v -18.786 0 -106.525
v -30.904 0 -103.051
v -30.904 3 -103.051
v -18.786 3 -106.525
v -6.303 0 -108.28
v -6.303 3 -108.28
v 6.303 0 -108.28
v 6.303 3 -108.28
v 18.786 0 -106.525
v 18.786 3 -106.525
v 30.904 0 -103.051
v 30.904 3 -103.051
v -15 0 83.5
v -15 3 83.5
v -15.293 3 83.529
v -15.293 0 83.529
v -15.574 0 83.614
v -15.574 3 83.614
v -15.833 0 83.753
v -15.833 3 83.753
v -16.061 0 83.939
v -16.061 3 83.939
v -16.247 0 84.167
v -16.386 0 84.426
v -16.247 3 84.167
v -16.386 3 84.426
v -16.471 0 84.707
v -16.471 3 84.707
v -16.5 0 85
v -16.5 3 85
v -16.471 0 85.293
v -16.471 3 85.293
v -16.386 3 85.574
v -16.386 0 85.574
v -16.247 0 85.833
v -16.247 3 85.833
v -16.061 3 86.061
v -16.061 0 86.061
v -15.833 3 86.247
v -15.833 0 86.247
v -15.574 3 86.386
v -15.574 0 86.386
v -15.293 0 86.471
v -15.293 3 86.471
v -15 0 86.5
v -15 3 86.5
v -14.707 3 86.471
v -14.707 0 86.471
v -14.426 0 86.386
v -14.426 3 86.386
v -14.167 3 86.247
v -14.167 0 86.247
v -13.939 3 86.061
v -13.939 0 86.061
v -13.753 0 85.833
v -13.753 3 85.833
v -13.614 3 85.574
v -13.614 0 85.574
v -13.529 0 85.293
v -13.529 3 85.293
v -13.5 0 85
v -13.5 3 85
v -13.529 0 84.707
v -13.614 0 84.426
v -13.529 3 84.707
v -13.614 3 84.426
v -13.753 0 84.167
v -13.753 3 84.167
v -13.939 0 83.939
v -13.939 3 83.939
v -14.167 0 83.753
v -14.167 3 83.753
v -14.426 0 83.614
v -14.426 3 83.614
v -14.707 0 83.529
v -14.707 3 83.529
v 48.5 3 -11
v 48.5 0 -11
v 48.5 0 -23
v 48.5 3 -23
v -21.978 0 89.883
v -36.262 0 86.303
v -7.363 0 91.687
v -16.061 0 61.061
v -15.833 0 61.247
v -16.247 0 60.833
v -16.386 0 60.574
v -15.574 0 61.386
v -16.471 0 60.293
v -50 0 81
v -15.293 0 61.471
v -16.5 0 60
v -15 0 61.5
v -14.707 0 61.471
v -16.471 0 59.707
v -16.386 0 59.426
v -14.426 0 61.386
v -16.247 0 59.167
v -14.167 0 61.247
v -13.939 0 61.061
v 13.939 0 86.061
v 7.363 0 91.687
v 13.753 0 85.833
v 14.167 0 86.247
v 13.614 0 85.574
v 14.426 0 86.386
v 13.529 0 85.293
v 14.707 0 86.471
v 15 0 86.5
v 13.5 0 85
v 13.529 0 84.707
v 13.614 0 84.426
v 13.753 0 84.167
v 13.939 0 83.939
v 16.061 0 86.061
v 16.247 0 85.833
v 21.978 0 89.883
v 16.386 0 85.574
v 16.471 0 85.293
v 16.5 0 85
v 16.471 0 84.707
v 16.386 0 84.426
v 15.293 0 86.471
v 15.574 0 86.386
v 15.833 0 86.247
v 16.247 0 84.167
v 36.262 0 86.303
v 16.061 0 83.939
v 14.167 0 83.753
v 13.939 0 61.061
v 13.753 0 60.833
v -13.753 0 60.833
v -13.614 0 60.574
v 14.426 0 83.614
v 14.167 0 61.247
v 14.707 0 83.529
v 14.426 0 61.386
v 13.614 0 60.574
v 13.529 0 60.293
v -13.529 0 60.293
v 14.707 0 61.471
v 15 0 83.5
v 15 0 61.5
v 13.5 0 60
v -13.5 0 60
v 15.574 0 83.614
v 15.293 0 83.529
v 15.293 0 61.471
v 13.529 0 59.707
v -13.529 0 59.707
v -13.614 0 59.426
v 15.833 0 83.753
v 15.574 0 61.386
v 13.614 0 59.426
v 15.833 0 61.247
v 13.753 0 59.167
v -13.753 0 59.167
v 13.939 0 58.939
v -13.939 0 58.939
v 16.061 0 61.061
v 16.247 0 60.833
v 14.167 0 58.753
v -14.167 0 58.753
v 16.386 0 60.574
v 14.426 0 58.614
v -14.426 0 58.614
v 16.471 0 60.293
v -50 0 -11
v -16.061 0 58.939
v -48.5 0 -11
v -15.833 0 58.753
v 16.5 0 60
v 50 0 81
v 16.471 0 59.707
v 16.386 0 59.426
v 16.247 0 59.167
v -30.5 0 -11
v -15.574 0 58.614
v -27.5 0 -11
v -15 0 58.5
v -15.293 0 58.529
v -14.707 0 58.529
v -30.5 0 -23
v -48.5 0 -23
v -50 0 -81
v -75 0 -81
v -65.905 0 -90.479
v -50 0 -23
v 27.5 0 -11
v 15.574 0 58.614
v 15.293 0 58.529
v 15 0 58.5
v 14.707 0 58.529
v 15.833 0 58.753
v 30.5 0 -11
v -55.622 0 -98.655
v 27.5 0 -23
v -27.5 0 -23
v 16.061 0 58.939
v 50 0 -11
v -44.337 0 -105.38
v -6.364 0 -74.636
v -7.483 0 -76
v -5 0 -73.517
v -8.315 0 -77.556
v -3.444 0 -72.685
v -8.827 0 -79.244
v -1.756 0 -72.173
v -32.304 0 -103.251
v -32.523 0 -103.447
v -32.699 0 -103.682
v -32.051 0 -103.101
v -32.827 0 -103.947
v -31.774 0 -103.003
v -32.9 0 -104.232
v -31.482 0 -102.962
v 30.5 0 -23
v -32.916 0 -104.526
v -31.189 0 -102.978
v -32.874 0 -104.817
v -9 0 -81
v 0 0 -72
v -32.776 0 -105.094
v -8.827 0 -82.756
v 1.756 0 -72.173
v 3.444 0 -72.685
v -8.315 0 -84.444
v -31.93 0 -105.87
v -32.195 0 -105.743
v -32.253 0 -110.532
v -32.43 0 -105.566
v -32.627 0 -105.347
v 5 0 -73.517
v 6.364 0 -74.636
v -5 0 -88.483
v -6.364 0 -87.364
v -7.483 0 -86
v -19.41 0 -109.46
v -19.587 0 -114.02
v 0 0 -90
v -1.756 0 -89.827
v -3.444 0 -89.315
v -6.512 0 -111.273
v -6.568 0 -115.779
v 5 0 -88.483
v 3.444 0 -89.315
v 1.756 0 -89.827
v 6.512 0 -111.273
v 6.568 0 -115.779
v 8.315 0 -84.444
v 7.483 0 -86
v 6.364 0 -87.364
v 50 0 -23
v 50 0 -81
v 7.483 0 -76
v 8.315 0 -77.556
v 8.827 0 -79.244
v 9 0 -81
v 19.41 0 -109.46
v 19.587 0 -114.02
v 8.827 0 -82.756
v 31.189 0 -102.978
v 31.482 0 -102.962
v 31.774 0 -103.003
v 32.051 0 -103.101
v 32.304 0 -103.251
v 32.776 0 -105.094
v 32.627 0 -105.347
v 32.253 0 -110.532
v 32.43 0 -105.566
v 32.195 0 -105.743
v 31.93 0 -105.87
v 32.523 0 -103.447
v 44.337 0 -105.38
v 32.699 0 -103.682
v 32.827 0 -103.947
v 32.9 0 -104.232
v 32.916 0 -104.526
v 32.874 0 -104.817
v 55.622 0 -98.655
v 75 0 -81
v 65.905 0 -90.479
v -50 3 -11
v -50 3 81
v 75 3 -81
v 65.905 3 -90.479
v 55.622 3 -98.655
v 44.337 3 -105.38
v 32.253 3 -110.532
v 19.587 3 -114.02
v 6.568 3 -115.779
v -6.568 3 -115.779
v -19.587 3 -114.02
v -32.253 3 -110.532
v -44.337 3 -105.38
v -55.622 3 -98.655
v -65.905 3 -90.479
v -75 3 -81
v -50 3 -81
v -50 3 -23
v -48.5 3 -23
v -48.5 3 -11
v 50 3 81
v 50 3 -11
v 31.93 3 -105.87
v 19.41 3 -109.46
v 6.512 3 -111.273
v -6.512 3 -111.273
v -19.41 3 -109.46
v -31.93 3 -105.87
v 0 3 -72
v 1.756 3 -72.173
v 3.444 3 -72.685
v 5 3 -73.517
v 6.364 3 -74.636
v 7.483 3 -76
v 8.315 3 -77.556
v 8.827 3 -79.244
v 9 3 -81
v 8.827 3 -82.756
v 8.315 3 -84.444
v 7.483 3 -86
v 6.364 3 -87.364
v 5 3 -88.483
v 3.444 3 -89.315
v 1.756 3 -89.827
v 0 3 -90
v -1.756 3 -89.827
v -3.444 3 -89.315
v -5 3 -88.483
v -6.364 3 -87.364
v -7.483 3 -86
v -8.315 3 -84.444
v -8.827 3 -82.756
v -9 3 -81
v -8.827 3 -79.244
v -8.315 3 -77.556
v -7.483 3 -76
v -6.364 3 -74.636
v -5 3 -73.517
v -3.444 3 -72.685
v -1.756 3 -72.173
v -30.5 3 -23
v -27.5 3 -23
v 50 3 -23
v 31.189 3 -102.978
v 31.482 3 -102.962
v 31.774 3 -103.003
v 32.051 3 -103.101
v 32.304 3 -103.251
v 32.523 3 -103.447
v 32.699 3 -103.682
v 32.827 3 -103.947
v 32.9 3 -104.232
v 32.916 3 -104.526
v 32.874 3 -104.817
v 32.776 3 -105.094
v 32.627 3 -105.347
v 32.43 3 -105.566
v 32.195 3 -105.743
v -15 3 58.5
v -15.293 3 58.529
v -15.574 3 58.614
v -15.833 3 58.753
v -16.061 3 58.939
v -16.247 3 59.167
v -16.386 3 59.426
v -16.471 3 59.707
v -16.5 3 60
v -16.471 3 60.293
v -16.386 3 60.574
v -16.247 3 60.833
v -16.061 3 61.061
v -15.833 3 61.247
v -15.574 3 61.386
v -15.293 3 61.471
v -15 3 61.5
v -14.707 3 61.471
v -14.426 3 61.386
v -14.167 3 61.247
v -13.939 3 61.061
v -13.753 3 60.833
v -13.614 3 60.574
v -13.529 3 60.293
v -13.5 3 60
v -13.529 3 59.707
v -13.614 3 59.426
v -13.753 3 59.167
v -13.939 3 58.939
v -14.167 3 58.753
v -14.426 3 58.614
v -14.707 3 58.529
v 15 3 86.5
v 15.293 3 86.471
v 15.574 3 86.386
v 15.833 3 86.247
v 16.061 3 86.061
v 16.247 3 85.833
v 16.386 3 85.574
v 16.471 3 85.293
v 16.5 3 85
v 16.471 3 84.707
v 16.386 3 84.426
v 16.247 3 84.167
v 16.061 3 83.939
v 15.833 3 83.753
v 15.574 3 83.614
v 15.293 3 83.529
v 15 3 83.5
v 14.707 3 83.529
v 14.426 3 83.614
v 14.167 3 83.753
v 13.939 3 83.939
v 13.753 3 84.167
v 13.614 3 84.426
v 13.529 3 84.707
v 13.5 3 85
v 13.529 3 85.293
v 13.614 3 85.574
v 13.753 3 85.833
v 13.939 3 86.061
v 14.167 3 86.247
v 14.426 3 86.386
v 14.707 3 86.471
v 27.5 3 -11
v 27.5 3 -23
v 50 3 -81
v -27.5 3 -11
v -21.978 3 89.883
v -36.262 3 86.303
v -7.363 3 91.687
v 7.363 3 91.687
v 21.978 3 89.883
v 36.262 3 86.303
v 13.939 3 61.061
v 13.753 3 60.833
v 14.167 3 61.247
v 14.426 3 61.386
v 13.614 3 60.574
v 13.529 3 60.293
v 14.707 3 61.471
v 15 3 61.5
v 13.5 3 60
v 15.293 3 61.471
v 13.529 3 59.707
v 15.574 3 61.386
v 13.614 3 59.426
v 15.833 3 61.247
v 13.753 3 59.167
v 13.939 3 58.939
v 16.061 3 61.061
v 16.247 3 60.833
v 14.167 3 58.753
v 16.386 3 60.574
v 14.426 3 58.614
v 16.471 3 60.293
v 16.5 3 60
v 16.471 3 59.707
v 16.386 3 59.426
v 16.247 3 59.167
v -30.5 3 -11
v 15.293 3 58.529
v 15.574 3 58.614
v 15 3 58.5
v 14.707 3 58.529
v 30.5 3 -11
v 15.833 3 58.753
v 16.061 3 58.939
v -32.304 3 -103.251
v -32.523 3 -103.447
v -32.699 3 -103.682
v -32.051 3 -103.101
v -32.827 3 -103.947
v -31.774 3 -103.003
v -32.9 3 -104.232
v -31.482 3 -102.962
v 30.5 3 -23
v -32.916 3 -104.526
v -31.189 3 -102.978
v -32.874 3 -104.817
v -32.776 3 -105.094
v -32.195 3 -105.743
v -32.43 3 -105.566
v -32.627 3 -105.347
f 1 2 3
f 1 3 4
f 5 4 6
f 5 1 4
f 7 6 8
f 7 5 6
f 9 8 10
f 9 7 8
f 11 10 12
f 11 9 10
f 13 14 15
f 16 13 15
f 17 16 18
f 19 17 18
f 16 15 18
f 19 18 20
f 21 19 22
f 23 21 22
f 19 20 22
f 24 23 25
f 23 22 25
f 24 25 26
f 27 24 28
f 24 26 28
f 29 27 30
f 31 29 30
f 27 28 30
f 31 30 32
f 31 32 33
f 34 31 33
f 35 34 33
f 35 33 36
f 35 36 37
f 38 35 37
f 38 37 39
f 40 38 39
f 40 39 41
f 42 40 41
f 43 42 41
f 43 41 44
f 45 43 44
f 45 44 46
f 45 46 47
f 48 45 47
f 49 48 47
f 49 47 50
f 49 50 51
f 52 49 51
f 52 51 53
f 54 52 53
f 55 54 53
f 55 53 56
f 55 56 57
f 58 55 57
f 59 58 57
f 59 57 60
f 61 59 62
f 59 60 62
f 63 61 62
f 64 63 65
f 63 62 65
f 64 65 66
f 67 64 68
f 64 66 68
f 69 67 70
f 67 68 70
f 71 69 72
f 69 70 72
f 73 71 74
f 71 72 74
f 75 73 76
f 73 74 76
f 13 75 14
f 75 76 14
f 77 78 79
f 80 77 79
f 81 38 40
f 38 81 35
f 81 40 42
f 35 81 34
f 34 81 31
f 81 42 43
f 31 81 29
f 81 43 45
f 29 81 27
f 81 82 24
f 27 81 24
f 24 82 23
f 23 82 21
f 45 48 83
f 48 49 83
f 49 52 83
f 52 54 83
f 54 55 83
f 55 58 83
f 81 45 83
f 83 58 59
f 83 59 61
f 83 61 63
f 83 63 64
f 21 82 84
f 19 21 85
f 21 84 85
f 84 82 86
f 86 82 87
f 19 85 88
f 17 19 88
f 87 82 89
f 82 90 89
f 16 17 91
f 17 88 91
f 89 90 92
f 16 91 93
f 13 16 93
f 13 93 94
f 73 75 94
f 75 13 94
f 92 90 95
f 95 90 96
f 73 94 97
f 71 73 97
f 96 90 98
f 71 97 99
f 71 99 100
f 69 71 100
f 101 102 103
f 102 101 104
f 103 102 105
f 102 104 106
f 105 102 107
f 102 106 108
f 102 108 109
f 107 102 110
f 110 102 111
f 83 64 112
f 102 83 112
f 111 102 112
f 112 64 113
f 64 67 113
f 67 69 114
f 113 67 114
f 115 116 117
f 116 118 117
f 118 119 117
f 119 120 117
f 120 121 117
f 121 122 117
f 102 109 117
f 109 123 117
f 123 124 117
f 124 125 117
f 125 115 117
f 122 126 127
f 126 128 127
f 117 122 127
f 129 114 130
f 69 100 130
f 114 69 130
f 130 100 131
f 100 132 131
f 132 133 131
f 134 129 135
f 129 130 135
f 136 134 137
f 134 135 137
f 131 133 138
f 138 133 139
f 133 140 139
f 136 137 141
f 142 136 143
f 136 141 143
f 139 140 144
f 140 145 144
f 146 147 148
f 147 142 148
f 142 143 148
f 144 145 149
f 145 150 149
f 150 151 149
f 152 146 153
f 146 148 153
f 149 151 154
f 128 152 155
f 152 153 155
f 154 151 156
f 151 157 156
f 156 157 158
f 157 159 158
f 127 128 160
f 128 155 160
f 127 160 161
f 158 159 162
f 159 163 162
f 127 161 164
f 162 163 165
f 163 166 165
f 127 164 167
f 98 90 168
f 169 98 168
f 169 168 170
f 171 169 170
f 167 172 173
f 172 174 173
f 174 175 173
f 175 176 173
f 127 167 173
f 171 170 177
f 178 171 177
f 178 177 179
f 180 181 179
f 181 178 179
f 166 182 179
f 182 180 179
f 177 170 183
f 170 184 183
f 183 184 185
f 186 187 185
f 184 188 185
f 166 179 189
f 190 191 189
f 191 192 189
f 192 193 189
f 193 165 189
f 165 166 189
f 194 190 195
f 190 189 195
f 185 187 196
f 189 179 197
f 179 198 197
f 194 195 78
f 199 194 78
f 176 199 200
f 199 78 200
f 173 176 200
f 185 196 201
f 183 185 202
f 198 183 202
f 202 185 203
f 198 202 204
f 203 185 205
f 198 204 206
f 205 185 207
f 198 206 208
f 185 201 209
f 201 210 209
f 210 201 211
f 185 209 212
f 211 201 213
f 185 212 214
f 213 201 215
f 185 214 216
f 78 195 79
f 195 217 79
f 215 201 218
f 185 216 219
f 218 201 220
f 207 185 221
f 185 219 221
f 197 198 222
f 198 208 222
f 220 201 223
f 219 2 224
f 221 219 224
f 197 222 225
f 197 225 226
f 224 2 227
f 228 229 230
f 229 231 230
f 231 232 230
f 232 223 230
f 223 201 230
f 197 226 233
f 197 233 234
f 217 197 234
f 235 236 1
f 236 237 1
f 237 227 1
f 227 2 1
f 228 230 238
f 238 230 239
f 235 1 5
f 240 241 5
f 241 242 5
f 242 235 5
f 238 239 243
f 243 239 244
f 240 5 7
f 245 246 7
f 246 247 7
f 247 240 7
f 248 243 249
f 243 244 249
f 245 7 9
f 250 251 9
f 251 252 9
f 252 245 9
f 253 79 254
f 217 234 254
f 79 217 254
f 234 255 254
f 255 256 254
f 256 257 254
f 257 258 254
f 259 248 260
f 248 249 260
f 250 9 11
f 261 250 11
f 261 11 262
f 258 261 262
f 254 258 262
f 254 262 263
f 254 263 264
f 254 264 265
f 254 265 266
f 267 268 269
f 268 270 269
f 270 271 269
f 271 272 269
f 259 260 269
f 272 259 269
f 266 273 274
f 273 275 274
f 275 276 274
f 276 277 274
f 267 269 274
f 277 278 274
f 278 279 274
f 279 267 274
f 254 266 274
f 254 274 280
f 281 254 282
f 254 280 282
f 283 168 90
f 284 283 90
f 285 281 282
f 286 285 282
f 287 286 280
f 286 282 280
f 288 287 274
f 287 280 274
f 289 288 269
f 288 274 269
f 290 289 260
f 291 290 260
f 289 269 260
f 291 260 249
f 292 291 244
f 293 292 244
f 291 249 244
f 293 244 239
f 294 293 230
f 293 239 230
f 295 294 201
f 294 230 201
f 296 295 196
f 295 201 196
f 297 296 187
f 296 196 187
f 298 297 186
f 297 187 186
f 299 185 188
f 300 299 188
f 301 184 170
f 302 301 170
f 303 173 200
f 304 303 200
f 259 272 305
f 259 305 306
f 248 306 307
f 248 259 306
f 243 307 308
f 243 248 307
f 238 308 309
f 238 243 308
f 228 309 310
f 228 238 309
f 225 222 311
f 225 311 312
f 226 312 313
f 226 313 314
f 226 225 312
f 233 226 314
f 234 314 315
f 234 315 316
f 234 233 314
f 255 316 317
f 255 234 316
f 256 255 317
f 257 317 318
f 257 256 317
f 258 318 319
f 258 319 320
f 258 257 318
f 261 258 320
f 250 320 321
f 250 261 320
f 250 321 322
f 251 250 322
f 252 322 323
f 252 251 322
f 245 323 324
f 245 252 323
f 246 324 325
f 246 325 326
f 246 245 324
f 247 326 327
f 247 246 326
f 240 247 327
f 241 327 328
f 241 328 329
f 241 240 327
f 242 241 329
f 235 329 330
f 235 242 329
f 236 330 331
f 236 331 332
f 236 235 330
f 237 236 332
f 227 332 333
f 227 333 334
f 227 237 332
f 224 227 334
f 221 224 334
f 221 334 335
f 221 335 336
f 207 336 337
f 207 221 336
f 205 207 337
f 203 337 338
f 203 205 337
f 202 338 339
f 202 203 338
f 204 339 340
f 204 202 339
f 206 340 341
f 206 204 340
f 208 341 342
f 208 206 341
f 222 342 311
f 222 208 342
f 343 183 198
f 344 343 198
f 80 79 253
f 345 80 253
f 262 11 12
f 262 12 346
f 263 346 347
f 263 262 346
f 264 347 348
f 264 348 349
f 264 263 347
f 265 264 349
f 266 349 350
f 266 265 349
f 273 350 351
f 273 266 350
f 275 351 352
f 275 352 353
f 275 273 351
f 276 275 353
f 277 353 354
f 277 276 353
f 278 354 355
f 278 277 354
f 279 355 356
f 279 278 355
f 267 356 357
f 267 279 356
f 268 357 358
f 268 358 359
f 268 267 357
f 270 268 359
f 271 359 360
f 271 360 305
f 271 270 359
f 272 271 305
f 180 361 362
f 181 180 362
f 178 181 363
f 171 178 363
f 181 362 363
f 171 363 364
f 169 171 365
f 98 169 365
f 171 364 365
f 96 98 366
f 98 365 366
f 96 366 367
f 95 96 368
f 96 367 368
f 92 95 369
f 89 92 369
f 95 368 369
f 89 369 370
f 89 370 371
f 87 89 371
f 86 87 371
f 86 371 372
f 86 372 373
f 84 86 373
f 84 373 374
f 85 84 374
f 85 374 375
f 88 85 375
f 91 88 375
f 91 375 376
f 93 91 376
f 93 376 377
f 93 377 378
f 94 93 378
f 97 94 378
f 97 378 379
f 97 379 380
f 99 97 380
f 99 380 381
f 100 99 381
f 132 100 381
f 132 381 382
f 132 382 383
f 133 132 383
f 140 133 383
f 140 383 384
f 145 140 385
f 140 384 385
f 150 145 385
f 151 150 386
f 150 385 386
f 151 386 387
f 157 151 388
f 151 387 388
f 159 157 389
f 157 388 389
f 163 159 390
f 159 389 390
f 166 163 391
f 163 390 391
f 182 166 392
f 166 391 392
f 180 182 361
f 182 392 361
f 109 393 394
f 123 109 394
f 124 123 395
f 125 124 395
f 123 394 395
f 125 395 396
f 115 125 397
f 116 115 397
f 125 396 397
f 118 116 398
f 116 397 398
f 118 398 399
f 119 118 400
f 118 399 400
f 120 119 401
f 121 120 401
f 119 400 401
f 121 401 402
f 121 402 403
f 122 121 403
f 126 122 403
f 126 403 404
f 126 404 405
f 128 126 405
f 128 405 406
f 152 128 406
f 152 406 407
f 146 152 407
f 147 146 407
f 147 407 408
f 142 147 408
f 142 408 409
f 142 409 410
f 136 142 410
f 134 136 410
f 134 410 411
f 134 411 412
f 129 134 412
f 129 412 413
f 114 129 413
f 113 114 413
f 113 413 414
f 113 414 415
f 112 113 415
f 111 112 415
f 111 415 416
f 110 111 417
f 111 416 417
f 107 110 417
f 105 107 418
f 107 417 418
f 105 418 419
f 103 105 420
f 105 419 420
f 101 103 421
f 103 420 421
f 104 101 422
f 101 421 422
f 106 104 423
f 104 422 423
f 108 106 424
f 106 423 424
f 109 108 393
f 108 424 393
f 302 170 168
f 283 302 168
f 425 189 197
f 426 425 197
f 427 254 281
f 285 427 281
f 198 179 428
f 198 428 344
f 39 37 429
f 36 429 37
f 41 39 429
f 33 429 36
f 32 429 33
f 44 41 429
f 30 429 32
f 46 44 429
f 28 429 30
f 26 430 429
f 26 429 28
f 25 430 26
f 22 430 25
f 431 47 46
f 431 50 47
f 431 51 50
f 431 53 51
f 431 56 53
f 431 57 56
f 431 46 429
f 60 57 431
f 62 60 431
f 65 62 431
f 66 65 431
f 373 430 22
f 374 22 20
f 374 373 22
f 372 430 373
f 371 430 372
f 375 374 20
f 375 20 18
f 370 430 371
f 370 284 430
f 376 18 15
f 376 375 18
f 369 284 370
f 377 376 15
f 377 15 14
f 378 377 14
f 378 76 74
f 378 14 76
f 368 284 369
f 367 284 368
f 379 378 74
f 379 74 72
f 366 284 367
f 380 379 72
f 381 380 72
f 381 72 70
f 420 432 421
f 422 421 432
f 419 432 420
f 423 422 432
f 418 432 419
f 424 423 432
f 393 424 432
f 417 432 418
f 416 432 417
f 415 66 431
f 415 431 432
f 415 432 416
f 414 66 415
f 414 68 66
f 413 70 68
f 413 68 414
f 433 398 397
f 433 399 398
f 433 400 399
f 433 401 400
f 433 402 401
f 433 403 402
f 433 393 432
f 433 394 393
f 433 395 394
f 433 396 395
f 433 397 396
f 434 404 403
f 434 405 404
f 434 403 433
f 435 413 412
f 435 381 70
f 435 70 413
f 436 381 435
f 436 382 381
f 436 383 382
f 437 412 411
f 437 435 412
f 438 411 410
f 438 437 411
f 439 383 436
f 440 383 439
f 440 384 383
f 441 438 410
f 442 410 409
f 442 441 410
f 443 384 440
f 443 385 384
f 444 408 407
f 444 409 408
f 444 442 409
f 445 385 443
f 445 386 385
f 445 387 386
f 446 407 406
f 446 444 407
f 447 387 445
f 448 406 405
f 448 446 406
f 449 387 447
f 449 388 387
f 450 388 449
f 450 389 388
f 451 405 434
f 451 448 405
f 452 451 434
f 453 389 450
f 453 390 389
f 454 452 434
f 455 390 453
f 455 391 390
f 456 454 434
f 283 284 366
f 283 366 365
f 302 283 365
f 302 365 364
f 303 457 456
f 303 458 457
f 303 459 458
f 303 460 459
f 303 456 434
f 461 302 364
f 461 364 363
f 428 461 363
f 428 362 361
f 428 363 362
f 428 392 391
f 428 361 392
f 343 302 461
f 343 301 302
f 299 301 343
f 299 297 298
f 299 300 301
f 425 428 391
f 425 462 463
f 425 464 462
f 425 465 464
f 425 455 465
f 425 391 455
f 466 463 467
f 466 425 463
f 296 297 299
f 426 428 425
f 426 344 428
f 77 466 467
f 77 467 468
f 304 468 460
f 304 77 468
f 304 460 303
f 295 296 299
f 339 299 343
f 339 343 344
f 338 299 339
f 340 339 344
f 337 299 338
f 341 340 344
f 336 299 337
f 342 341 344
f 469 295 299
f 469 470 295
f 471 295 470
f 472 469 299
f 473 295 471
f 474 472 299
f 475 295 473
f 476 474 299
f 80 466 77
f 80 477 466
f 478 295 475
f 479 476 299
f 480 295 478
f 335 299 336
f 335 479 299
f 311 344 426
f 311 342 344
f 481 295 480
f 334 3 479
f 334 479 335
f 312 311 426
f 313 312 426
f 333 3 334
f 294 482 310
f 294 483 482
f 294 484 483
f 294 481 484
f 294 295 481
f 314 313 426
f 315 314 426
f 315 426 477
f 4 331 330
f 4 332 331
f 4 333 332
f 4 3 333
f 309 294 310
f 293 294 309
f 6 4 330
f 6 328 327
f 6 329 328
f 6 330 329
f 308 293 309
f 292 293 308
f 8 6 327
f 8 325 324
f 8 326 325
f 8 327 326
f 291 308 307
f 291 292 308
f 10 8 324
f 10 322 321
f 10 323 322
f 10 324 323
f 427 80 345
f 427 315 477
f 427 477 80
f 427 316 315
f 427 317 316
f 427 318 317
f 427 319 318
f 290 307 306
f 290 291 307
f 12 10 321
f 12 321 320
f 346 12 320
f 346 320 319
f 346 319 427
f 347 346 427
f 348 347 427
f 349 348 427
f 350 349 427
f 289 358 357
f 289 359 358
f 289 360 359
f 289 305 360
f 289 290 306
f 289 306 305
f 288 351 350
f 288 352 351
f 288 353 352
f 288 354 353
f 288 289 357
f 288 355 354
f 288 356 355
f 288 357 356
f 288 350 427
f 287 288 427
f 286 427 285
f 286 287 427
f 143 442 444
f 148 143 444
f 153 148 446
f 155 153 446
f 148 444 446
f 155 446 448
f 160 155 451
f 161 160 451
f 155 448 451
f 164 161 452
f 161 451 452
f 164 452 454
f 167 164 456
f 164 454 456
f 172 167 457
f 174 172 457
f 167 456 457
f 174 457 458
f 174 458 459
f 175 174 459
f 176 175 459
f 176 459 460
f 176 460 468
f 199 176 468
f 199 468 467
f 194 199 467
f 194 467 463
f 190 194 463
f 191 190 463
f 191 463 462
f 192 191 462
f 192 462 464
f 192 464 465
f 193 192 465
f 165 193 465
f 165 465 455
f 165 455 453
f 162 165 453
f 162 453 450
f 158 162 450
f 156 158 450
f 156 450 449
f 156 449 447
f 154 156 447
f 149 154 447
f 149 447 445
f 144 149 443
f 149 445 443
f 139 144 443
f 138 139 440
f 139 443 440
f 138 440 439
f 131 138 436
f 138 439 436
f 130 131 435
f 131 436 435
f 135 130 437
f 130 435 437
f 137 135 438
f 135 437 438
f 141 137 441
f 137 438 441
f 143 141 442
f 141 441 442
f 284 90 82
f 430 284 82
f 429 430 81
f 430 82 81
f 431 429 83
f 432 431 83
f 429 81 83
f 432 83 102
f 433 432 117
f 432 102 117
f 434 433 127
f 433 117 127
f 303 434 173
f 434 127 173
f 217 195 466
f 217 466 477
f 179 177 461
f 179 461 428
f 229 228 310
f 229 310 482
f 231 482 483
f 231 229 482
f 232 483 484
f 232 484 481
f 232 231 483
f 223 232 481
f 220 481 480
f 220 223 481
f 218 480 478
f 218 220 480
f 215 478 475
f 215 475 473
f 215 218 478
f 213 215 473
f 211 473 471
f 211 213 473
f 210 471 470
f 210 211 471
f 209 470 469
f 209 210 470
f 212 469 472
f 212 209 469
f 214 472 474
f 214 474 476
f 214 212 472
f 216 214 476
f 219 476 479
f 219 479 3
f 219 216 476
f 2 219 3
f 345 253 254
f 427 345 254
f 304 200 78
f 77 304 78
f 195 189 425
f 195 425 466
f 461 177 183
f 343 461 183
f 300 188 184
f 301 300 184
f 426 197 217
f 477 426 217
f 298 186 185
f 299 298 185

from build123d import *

# Parameters (mm, degrees)
SKETCH1_R           = 9
SKETCH1_W           = 3
SKETCH1_H           = 12
BOSS_EXTRUDE1_DEPTH = 3
SKETCH2_R           = 1.5
CUT_EXTRUDE1_DEPTH  = 139.166566144


with BuildPart() as part:
    # Sketch1 → Boss-Extrude1 (new body)
    with BuildSketch(Plane(origin=(0, 0, 0), x_dir=(1, 0, 0), z_dir=(0, 1, 0))):
        with BuildLine():
            Line((50, -81), (50, 11))
            Line((50, 11), (48.5, 11))
            Line((48.5, 11), (48.5, 23))
            Line((48.5, 23), (50, 23))
            Line((50, 23), (50, 81))
            Line((50, 81), (75, 81))
            ThreePointArc((75, 81), (0, 116), (-75, 81))
            Line((-75, 81), (-50, 81))
            Line((-50, 81), (-50, 23))
            Line((-50, 23), (-48.5, 23))
            Line((-48.5, 23), (-48.5, 11))
            Line((-48.5, 11), (-50, 11))
            Line((-50, 11), (-50, -81))
            ThreePointArc((-50, -81), (0, -91.912878854), (50, -81))
        make_face()
        with Locations(Location((0, 81, 0), (0, 0, 270))):
            Circle(SKETCH1_R, mode=Mode.SUBTRACT)
        with Locations((-29, 17)):
            Rectangle(SKETCH1_W, SKETCH1_H, mode=Mode.SUBTRACT)
        with Locations((29, 17)):
            Rectangle(SKETCH1_W, SKETCH1_H, mode=Mode.SUBTRACT)
        with BuildLine():
            ThreePointArc((31.93002338, 105.869875383), (0, 111.5), (-31.93002338, 105.869875383))
            ThreePointArc((-31.93002338, 105.869875383), (-32.826532097, 103.947306237), (-30.90396295, 103.050797521))
            ThreePointArc((-30.90396295, 103.050797521), (0, 108.5), (30.90396295, 103.050797521))
            ThreePointArc((30.90396295, 103.050797521), (32.826532097, 103.947306237), (31.93002338, 105.869875383))
        make_face(mode=Mode.SUBTRACT)
    extrude(amount=BOSS_EXTRUDE1_DEPTH)

    # Sketch2 → Cut-Extrude1 (cut, through all)
    with BuildSketch(Plane(origin=(0, 3, 0), x_dir=(1, 0, 0), z_dir=(0, 1, 0))):
        with Locations(Location((15, -60, 0), (0, 0, 270))):
            Circle(SKETCH2_R)
        with Locations(Location((15, -85, 0), (0, 0, 270))):
            Circle(SKETCH2_R)
        with Locations(Location((-15, -85, 0), (0, 0, 90))):
            Circle(SKETCH2_R)
        with Locations(Location((-15, -60, 0), (0, 0, 90))):
            Circle(SKETCH2_R)
    extrude(amount=-CUT_EXTRUDE1_DEPTH, mode=Mode.SUBTRACT)


solid = part.part
